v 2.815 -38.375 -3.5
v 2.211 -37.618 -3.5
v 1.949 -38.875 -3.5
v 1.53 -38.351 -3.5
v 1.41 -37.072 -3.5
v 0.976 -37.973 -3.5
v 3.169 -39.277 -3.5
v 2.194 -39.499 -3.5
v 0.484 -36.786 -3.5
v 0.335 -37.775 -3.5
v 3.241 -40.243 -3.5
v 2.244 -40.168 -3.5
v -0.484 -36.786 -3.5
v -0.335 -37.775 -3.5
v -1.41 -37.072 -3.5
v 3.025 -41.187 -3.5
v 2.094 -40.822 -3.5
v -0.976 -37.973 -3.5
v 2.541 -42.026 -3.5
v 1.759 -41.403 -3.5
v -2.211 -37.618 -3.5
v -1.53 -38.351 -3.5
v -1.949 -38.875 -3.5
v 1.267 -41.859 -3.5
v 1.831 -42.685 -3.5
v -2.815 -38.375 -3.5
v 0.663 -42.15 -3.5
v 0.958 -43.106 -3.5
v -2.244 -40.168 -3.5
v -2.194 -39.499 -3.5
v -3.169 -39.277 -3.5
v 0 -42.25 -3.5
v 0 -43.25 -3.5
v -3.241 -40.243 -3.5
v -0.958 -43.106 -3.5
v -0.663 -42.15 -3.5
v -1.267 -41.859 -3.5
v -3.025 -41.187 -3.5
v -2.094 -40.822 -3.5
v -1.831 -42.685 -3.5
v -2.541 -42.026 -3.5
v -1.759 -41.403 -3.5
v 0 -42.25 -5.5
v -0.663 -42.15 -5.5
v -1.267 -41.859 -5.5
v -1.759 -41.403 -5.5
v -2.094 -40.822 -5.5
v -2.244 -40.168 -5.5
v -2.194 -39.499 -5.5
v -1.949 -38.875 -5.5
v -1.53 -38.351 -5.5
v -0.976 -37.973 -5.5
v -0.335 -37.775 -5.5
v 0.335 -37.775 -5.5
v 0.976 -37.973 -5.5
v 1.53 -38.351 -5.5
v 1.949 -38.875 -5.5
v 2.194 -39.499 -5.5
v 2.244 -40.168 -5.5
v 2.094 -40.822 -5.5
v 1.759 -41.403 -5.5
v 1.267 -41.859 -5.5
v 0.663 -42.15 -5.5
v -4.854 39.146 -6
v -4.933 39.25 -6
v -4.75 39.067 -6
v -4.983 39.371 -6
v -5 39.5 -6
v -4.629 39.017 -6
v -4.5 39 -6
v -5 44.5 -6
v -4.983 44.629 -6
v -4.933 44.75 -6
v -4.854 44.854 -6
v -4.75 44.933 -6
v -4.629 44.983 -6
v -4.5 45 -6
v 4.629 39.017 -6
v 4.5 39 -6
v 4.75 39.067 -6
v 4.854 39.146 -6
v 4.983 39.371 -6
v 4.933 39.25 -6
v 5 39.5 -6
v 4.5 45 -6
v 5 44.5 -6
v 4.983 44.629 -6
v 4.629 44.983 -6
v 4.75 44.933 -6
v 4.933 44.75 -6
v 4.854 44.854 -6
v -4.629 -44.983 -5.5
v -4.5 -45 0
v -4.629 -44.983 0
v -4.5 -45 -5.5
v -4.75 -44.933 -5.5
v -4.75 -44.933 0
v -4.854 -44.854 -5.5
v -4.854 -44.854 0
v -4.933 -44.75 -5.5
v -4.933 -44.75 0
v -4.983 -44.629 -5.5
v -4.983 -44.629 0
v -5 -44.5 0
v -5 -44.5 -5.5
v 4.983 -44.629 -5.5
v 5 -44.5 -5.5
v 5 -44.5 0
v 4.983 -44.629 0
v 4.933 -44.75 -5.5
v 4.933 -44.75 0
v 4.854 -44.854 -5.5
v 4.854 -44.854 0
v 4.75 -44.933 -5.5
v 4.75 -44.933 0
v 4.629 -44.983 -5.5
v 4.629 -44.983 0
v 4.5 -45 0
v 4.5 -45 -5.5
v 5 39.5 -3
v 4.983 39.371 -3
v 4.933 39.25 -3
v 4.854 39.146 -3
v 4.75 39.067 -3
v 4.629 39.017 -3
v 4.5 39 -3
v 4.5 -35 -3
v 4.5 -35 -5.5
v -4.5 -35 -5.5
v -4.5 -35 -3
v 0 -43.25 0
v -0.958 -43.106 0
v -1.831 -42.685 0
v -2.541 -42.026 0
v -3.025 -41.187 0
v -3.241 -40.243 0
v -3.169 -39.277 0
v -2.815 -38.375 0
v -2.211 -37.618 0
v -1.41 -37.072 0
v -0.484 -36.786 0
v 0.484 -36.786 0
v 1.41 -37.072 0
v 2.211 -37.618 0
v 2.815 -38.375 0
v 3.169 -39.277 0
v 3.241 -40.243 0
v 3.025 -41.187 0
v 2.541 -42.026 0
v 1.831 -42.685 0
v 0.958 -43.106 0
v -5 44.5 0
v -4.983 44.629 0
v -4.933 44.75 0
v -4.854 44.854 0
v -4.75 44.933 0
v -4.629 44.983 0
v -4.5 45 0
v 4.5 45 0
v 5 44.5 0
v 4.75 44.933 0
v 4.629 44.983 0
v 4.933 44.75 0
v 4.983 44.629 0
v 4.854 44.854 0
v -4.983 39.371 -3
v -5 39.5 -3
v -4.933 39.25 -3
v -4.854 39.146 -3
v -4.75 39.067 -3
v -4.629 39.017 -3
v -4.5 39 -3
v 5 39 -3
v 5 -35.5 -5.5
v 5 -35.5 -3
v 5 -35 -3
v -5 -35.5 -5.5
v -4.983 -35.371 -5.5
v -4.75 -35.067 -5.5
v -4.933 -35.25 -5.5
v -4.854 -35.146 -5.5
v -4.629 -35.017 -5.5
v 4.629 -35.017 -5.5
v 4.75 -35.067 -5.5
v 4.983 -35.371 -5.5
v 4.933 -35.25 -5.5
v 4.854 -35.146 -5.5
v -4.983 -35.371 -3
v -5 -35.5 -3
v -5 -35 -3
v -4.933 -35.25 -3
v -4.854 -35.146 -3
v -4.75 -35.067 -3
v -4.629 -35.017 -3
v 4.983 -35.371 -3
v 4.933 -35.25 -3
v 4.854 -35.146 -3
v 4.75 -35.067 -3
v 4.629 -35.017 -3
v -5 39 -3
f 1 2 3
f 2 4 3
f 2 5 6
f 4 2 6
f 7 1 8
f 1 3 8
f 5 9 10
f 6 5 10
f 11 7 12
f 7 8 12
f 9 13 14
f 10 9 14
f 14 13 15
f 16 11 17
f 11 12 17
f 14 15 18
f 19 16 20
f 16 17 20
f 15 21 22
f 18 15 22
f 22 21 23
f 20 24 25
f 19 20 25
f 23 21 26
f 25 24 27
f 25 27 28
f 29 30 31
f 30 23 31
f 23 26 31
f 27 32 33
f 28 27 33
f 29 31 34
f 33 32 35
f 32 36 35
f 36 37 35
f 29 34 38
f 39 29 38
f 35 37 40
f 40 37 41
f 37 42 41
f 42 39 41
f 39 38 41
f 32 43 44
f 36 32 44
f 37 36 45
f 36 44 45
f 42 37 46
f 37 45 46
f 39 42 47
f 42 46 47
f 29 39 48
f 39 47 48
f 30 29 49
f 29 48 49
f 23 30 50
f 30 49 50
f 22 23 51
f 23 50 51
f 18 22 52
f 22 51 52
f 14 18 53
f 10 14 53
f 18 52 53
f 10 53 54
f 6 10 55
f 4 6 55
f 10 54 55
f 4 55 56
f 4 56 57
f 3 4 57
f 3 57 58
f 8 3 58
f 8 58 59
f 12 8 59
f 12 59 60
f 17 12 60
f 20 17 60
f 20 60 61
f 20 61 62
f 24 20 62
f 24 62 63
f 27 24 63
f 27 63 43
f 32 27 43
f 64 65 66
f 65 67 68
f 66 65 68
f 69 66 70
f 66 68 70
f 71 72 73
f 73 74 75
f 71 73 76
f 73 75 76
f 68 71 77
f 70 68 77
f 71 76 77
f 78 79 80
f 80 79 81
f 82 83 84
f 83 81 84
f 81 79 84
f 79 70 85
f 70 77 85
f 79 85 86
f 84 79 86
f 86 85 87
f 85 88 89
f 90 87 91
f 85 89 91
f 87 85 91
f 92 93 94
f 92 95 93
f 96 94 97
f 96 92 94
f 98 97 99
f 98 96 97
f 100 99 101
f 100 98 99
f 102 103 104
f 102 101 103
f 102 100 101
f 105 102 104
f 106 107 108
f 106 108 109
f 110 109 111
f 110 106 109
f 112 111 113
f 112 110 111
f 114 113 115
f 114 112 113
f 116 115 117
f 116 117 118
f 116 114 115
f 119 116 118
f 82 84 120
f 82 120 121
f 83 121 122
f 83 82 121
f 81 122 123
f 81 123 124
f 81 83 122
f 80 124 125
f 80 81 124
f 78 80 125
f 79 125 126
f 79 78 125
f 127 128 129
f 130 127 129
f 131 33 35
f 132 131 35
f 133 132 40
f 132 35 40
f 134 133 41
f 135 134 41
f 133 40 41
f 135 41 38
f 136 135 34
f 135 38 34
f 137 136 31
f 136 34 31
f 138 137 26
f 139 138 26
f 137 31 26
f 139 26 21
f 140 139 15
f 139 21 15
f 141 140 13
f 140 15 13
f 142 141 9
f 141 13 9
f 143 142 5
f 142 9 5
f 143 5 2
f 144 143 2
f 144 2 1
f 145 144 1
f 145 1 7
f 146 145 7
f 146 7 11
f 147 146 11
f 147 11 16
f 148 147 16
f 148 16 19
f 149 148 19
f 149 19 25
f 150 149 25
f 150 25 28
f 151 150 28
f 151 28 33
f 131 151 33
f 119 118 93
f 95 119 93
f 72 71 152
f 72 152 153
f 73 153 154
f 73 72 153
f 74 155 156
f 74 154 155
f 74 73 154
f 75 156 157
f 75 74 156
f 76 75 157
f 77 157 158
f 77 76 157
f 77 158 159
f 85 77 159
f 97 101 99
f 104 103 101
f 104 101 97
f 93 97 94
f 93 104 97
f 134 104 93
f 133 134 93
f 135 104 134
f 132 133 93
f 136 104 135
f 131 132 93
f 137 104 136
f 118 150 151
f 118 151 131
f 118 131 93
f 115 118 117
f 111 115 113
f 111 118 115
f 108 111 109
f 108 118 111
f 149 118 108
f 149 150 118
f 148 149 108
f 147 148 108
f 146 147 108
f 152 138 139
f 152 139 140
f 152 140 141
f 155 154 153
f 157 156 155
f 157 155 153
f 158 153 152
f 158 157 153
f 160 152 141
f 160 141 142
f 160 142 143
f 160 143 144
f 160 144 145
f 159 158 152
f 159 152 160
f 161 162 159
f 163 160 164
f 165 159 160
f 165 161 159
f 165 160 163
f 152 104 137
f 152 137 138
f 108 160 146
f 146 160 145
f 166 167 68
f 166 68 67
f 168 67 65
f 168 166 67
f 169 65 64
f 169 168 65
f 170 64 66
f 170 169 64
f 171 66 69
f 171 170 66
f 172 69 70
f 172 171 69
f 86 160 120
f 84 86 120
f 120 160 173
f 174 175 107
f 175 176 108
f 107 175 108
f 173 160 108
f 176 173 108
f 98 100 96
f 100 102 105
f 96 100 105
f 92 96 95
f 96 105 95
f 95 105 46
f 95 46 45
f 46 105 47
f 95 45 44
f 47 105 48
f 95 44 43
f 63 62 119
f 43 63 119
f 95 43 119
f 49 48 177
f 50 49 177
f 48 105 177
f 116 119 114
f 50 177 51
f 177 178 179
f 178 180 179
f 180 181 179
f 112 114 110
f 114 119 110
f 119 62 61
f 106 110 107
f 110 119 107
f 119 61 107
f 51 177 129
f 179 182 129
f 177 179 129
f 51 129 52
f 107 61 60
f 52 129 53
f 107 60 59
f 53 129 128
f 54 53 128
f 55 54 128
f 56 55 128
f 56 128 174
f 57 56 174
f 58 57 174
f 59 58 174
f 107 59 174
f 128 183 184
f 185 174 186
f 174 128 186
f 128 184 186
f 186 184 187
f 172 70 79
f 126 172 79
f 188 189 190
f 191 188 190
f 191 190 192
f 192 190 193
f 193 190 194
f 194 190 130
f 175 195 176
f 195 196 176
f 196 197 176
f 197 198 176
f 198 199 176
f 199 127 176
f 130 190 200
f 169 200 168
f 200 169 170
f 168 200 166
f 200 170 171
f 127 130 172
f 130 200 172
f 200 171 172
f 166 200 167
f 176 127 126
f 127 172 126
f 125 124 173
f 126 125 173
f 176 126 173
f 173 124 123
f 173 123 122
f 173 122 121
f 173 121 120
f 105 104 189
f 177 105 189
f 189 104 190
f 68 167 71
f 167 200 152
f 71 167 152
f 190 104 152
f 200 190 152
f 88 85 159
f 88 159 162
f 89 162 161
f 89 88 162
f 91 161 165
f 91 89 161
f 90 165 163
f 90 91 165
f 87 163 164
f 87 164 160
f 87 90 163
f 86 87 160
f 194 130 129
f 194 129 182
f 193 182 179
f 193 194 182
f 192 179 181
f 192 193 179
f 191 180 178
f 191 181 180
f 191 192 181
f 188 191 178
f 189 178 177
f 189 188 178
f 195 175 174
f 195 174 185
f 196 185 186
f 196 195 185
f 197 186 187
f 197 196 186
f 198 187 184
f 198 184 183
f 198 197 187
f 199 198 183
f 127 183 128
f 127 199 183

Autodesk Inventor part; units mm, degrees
ref_plane "YZ Plane" through (0, 0, 0) normal (1, 0, 0) x (0, 1, 0)
ref_plane "XZ Plane" through (0, 0, 0) normal (0, 1, 0) x (-1, 0, 0)
ref_plane "XY Plane" through (0, 0, 0) normal (0, 0, 1) x (1, 0, 0)
sketch "Esboço1" plane through (0, 0, 0) normal (0, 0, 1) x (1, 0, 0)
  line L0 (-119, 0) -> (119, 0) construction
  line L1 (0, -159) -> (0, 79) construction
  line L2 (-5, 45) -> (5, 45)
  line L3 (5, 45) -> (5, -45)
  line L4 (5, -45) -> (-5, -45)
  line L5 (-5, -45) -> (-5, 45)
  circle A0 centre (0, -40) radius 5
  circle A1 centre (0, 40) radius 5
  circle A2 centre (0, 42) radius 3
  line L6 (-5, 39) -> (5, 39)
  line L7 (5, 39) -> (5, -35)
  line L8 (5, -35) -> (-5, -35)
  line L9 (-5, -35) -> (-5, 39)
  circle A3 centre (0, -40) radius 85
  point P0 (0, 0)
  point P1 (5, 39)
  point P2 (-5, -35)
  dimension "d0" = 10
  dimension "d2" = 85
  dimension "d3" = 90
  dimension "d4" = 6
  dimension "d20" = 170
extrude "Extrusão1" add sketch "Esboço1" against normal blind 6 contours L2 A3 L5 | A3 L3 A1 | A2 L6 A1 | A1 L6 A2 | A2 | L2 L3 A3 | A1 L5 A3 | L3 L6 A1 | A1 L6 L5 | L6 A1 | L3 L8 L5 L6 A1 | L3 A0 L8 | L8 A0 L5 | A0 | L3 L4 A0 | A0 L4 L5
extrude "Extrusão2" cut sketch "Esboço1" along normal blind 0.5 from surface at -6 contours L6 A1 | L3 L8 L5 L6 A1 | L3 A0 L8 | L8 A0 L5 | A0 | L3 L4 A0 | A0 L4 L5
extrude "Extrusão3" cut sketch "Esboço1" along normal blind 2.5 from surface at -5.5 contours L6 A1 | L3 L8 L5 L6 A1
hole "Furo1" at (0, -40, 0) direction (0, 0, -1) diameter 4.5 end through all counterbore diameter 6.5 counterbore depth 3.5 clearance for "Socket Head Cap Screw ISO 4762" size "M4" standard "ISO"
fillet "Arredondamento1" radius 0.5 8 edges at (-5, 39, -4.5) (5, 39, -4.5) (-5, 45, -3) (5, 45, -3) (-5, -35, -4.25) (-5, -45, -2.75) (5, -45, -2.75) (5, -35, -4.25)
properties part number "VEJ-00-015" material "Fenolite OR"
